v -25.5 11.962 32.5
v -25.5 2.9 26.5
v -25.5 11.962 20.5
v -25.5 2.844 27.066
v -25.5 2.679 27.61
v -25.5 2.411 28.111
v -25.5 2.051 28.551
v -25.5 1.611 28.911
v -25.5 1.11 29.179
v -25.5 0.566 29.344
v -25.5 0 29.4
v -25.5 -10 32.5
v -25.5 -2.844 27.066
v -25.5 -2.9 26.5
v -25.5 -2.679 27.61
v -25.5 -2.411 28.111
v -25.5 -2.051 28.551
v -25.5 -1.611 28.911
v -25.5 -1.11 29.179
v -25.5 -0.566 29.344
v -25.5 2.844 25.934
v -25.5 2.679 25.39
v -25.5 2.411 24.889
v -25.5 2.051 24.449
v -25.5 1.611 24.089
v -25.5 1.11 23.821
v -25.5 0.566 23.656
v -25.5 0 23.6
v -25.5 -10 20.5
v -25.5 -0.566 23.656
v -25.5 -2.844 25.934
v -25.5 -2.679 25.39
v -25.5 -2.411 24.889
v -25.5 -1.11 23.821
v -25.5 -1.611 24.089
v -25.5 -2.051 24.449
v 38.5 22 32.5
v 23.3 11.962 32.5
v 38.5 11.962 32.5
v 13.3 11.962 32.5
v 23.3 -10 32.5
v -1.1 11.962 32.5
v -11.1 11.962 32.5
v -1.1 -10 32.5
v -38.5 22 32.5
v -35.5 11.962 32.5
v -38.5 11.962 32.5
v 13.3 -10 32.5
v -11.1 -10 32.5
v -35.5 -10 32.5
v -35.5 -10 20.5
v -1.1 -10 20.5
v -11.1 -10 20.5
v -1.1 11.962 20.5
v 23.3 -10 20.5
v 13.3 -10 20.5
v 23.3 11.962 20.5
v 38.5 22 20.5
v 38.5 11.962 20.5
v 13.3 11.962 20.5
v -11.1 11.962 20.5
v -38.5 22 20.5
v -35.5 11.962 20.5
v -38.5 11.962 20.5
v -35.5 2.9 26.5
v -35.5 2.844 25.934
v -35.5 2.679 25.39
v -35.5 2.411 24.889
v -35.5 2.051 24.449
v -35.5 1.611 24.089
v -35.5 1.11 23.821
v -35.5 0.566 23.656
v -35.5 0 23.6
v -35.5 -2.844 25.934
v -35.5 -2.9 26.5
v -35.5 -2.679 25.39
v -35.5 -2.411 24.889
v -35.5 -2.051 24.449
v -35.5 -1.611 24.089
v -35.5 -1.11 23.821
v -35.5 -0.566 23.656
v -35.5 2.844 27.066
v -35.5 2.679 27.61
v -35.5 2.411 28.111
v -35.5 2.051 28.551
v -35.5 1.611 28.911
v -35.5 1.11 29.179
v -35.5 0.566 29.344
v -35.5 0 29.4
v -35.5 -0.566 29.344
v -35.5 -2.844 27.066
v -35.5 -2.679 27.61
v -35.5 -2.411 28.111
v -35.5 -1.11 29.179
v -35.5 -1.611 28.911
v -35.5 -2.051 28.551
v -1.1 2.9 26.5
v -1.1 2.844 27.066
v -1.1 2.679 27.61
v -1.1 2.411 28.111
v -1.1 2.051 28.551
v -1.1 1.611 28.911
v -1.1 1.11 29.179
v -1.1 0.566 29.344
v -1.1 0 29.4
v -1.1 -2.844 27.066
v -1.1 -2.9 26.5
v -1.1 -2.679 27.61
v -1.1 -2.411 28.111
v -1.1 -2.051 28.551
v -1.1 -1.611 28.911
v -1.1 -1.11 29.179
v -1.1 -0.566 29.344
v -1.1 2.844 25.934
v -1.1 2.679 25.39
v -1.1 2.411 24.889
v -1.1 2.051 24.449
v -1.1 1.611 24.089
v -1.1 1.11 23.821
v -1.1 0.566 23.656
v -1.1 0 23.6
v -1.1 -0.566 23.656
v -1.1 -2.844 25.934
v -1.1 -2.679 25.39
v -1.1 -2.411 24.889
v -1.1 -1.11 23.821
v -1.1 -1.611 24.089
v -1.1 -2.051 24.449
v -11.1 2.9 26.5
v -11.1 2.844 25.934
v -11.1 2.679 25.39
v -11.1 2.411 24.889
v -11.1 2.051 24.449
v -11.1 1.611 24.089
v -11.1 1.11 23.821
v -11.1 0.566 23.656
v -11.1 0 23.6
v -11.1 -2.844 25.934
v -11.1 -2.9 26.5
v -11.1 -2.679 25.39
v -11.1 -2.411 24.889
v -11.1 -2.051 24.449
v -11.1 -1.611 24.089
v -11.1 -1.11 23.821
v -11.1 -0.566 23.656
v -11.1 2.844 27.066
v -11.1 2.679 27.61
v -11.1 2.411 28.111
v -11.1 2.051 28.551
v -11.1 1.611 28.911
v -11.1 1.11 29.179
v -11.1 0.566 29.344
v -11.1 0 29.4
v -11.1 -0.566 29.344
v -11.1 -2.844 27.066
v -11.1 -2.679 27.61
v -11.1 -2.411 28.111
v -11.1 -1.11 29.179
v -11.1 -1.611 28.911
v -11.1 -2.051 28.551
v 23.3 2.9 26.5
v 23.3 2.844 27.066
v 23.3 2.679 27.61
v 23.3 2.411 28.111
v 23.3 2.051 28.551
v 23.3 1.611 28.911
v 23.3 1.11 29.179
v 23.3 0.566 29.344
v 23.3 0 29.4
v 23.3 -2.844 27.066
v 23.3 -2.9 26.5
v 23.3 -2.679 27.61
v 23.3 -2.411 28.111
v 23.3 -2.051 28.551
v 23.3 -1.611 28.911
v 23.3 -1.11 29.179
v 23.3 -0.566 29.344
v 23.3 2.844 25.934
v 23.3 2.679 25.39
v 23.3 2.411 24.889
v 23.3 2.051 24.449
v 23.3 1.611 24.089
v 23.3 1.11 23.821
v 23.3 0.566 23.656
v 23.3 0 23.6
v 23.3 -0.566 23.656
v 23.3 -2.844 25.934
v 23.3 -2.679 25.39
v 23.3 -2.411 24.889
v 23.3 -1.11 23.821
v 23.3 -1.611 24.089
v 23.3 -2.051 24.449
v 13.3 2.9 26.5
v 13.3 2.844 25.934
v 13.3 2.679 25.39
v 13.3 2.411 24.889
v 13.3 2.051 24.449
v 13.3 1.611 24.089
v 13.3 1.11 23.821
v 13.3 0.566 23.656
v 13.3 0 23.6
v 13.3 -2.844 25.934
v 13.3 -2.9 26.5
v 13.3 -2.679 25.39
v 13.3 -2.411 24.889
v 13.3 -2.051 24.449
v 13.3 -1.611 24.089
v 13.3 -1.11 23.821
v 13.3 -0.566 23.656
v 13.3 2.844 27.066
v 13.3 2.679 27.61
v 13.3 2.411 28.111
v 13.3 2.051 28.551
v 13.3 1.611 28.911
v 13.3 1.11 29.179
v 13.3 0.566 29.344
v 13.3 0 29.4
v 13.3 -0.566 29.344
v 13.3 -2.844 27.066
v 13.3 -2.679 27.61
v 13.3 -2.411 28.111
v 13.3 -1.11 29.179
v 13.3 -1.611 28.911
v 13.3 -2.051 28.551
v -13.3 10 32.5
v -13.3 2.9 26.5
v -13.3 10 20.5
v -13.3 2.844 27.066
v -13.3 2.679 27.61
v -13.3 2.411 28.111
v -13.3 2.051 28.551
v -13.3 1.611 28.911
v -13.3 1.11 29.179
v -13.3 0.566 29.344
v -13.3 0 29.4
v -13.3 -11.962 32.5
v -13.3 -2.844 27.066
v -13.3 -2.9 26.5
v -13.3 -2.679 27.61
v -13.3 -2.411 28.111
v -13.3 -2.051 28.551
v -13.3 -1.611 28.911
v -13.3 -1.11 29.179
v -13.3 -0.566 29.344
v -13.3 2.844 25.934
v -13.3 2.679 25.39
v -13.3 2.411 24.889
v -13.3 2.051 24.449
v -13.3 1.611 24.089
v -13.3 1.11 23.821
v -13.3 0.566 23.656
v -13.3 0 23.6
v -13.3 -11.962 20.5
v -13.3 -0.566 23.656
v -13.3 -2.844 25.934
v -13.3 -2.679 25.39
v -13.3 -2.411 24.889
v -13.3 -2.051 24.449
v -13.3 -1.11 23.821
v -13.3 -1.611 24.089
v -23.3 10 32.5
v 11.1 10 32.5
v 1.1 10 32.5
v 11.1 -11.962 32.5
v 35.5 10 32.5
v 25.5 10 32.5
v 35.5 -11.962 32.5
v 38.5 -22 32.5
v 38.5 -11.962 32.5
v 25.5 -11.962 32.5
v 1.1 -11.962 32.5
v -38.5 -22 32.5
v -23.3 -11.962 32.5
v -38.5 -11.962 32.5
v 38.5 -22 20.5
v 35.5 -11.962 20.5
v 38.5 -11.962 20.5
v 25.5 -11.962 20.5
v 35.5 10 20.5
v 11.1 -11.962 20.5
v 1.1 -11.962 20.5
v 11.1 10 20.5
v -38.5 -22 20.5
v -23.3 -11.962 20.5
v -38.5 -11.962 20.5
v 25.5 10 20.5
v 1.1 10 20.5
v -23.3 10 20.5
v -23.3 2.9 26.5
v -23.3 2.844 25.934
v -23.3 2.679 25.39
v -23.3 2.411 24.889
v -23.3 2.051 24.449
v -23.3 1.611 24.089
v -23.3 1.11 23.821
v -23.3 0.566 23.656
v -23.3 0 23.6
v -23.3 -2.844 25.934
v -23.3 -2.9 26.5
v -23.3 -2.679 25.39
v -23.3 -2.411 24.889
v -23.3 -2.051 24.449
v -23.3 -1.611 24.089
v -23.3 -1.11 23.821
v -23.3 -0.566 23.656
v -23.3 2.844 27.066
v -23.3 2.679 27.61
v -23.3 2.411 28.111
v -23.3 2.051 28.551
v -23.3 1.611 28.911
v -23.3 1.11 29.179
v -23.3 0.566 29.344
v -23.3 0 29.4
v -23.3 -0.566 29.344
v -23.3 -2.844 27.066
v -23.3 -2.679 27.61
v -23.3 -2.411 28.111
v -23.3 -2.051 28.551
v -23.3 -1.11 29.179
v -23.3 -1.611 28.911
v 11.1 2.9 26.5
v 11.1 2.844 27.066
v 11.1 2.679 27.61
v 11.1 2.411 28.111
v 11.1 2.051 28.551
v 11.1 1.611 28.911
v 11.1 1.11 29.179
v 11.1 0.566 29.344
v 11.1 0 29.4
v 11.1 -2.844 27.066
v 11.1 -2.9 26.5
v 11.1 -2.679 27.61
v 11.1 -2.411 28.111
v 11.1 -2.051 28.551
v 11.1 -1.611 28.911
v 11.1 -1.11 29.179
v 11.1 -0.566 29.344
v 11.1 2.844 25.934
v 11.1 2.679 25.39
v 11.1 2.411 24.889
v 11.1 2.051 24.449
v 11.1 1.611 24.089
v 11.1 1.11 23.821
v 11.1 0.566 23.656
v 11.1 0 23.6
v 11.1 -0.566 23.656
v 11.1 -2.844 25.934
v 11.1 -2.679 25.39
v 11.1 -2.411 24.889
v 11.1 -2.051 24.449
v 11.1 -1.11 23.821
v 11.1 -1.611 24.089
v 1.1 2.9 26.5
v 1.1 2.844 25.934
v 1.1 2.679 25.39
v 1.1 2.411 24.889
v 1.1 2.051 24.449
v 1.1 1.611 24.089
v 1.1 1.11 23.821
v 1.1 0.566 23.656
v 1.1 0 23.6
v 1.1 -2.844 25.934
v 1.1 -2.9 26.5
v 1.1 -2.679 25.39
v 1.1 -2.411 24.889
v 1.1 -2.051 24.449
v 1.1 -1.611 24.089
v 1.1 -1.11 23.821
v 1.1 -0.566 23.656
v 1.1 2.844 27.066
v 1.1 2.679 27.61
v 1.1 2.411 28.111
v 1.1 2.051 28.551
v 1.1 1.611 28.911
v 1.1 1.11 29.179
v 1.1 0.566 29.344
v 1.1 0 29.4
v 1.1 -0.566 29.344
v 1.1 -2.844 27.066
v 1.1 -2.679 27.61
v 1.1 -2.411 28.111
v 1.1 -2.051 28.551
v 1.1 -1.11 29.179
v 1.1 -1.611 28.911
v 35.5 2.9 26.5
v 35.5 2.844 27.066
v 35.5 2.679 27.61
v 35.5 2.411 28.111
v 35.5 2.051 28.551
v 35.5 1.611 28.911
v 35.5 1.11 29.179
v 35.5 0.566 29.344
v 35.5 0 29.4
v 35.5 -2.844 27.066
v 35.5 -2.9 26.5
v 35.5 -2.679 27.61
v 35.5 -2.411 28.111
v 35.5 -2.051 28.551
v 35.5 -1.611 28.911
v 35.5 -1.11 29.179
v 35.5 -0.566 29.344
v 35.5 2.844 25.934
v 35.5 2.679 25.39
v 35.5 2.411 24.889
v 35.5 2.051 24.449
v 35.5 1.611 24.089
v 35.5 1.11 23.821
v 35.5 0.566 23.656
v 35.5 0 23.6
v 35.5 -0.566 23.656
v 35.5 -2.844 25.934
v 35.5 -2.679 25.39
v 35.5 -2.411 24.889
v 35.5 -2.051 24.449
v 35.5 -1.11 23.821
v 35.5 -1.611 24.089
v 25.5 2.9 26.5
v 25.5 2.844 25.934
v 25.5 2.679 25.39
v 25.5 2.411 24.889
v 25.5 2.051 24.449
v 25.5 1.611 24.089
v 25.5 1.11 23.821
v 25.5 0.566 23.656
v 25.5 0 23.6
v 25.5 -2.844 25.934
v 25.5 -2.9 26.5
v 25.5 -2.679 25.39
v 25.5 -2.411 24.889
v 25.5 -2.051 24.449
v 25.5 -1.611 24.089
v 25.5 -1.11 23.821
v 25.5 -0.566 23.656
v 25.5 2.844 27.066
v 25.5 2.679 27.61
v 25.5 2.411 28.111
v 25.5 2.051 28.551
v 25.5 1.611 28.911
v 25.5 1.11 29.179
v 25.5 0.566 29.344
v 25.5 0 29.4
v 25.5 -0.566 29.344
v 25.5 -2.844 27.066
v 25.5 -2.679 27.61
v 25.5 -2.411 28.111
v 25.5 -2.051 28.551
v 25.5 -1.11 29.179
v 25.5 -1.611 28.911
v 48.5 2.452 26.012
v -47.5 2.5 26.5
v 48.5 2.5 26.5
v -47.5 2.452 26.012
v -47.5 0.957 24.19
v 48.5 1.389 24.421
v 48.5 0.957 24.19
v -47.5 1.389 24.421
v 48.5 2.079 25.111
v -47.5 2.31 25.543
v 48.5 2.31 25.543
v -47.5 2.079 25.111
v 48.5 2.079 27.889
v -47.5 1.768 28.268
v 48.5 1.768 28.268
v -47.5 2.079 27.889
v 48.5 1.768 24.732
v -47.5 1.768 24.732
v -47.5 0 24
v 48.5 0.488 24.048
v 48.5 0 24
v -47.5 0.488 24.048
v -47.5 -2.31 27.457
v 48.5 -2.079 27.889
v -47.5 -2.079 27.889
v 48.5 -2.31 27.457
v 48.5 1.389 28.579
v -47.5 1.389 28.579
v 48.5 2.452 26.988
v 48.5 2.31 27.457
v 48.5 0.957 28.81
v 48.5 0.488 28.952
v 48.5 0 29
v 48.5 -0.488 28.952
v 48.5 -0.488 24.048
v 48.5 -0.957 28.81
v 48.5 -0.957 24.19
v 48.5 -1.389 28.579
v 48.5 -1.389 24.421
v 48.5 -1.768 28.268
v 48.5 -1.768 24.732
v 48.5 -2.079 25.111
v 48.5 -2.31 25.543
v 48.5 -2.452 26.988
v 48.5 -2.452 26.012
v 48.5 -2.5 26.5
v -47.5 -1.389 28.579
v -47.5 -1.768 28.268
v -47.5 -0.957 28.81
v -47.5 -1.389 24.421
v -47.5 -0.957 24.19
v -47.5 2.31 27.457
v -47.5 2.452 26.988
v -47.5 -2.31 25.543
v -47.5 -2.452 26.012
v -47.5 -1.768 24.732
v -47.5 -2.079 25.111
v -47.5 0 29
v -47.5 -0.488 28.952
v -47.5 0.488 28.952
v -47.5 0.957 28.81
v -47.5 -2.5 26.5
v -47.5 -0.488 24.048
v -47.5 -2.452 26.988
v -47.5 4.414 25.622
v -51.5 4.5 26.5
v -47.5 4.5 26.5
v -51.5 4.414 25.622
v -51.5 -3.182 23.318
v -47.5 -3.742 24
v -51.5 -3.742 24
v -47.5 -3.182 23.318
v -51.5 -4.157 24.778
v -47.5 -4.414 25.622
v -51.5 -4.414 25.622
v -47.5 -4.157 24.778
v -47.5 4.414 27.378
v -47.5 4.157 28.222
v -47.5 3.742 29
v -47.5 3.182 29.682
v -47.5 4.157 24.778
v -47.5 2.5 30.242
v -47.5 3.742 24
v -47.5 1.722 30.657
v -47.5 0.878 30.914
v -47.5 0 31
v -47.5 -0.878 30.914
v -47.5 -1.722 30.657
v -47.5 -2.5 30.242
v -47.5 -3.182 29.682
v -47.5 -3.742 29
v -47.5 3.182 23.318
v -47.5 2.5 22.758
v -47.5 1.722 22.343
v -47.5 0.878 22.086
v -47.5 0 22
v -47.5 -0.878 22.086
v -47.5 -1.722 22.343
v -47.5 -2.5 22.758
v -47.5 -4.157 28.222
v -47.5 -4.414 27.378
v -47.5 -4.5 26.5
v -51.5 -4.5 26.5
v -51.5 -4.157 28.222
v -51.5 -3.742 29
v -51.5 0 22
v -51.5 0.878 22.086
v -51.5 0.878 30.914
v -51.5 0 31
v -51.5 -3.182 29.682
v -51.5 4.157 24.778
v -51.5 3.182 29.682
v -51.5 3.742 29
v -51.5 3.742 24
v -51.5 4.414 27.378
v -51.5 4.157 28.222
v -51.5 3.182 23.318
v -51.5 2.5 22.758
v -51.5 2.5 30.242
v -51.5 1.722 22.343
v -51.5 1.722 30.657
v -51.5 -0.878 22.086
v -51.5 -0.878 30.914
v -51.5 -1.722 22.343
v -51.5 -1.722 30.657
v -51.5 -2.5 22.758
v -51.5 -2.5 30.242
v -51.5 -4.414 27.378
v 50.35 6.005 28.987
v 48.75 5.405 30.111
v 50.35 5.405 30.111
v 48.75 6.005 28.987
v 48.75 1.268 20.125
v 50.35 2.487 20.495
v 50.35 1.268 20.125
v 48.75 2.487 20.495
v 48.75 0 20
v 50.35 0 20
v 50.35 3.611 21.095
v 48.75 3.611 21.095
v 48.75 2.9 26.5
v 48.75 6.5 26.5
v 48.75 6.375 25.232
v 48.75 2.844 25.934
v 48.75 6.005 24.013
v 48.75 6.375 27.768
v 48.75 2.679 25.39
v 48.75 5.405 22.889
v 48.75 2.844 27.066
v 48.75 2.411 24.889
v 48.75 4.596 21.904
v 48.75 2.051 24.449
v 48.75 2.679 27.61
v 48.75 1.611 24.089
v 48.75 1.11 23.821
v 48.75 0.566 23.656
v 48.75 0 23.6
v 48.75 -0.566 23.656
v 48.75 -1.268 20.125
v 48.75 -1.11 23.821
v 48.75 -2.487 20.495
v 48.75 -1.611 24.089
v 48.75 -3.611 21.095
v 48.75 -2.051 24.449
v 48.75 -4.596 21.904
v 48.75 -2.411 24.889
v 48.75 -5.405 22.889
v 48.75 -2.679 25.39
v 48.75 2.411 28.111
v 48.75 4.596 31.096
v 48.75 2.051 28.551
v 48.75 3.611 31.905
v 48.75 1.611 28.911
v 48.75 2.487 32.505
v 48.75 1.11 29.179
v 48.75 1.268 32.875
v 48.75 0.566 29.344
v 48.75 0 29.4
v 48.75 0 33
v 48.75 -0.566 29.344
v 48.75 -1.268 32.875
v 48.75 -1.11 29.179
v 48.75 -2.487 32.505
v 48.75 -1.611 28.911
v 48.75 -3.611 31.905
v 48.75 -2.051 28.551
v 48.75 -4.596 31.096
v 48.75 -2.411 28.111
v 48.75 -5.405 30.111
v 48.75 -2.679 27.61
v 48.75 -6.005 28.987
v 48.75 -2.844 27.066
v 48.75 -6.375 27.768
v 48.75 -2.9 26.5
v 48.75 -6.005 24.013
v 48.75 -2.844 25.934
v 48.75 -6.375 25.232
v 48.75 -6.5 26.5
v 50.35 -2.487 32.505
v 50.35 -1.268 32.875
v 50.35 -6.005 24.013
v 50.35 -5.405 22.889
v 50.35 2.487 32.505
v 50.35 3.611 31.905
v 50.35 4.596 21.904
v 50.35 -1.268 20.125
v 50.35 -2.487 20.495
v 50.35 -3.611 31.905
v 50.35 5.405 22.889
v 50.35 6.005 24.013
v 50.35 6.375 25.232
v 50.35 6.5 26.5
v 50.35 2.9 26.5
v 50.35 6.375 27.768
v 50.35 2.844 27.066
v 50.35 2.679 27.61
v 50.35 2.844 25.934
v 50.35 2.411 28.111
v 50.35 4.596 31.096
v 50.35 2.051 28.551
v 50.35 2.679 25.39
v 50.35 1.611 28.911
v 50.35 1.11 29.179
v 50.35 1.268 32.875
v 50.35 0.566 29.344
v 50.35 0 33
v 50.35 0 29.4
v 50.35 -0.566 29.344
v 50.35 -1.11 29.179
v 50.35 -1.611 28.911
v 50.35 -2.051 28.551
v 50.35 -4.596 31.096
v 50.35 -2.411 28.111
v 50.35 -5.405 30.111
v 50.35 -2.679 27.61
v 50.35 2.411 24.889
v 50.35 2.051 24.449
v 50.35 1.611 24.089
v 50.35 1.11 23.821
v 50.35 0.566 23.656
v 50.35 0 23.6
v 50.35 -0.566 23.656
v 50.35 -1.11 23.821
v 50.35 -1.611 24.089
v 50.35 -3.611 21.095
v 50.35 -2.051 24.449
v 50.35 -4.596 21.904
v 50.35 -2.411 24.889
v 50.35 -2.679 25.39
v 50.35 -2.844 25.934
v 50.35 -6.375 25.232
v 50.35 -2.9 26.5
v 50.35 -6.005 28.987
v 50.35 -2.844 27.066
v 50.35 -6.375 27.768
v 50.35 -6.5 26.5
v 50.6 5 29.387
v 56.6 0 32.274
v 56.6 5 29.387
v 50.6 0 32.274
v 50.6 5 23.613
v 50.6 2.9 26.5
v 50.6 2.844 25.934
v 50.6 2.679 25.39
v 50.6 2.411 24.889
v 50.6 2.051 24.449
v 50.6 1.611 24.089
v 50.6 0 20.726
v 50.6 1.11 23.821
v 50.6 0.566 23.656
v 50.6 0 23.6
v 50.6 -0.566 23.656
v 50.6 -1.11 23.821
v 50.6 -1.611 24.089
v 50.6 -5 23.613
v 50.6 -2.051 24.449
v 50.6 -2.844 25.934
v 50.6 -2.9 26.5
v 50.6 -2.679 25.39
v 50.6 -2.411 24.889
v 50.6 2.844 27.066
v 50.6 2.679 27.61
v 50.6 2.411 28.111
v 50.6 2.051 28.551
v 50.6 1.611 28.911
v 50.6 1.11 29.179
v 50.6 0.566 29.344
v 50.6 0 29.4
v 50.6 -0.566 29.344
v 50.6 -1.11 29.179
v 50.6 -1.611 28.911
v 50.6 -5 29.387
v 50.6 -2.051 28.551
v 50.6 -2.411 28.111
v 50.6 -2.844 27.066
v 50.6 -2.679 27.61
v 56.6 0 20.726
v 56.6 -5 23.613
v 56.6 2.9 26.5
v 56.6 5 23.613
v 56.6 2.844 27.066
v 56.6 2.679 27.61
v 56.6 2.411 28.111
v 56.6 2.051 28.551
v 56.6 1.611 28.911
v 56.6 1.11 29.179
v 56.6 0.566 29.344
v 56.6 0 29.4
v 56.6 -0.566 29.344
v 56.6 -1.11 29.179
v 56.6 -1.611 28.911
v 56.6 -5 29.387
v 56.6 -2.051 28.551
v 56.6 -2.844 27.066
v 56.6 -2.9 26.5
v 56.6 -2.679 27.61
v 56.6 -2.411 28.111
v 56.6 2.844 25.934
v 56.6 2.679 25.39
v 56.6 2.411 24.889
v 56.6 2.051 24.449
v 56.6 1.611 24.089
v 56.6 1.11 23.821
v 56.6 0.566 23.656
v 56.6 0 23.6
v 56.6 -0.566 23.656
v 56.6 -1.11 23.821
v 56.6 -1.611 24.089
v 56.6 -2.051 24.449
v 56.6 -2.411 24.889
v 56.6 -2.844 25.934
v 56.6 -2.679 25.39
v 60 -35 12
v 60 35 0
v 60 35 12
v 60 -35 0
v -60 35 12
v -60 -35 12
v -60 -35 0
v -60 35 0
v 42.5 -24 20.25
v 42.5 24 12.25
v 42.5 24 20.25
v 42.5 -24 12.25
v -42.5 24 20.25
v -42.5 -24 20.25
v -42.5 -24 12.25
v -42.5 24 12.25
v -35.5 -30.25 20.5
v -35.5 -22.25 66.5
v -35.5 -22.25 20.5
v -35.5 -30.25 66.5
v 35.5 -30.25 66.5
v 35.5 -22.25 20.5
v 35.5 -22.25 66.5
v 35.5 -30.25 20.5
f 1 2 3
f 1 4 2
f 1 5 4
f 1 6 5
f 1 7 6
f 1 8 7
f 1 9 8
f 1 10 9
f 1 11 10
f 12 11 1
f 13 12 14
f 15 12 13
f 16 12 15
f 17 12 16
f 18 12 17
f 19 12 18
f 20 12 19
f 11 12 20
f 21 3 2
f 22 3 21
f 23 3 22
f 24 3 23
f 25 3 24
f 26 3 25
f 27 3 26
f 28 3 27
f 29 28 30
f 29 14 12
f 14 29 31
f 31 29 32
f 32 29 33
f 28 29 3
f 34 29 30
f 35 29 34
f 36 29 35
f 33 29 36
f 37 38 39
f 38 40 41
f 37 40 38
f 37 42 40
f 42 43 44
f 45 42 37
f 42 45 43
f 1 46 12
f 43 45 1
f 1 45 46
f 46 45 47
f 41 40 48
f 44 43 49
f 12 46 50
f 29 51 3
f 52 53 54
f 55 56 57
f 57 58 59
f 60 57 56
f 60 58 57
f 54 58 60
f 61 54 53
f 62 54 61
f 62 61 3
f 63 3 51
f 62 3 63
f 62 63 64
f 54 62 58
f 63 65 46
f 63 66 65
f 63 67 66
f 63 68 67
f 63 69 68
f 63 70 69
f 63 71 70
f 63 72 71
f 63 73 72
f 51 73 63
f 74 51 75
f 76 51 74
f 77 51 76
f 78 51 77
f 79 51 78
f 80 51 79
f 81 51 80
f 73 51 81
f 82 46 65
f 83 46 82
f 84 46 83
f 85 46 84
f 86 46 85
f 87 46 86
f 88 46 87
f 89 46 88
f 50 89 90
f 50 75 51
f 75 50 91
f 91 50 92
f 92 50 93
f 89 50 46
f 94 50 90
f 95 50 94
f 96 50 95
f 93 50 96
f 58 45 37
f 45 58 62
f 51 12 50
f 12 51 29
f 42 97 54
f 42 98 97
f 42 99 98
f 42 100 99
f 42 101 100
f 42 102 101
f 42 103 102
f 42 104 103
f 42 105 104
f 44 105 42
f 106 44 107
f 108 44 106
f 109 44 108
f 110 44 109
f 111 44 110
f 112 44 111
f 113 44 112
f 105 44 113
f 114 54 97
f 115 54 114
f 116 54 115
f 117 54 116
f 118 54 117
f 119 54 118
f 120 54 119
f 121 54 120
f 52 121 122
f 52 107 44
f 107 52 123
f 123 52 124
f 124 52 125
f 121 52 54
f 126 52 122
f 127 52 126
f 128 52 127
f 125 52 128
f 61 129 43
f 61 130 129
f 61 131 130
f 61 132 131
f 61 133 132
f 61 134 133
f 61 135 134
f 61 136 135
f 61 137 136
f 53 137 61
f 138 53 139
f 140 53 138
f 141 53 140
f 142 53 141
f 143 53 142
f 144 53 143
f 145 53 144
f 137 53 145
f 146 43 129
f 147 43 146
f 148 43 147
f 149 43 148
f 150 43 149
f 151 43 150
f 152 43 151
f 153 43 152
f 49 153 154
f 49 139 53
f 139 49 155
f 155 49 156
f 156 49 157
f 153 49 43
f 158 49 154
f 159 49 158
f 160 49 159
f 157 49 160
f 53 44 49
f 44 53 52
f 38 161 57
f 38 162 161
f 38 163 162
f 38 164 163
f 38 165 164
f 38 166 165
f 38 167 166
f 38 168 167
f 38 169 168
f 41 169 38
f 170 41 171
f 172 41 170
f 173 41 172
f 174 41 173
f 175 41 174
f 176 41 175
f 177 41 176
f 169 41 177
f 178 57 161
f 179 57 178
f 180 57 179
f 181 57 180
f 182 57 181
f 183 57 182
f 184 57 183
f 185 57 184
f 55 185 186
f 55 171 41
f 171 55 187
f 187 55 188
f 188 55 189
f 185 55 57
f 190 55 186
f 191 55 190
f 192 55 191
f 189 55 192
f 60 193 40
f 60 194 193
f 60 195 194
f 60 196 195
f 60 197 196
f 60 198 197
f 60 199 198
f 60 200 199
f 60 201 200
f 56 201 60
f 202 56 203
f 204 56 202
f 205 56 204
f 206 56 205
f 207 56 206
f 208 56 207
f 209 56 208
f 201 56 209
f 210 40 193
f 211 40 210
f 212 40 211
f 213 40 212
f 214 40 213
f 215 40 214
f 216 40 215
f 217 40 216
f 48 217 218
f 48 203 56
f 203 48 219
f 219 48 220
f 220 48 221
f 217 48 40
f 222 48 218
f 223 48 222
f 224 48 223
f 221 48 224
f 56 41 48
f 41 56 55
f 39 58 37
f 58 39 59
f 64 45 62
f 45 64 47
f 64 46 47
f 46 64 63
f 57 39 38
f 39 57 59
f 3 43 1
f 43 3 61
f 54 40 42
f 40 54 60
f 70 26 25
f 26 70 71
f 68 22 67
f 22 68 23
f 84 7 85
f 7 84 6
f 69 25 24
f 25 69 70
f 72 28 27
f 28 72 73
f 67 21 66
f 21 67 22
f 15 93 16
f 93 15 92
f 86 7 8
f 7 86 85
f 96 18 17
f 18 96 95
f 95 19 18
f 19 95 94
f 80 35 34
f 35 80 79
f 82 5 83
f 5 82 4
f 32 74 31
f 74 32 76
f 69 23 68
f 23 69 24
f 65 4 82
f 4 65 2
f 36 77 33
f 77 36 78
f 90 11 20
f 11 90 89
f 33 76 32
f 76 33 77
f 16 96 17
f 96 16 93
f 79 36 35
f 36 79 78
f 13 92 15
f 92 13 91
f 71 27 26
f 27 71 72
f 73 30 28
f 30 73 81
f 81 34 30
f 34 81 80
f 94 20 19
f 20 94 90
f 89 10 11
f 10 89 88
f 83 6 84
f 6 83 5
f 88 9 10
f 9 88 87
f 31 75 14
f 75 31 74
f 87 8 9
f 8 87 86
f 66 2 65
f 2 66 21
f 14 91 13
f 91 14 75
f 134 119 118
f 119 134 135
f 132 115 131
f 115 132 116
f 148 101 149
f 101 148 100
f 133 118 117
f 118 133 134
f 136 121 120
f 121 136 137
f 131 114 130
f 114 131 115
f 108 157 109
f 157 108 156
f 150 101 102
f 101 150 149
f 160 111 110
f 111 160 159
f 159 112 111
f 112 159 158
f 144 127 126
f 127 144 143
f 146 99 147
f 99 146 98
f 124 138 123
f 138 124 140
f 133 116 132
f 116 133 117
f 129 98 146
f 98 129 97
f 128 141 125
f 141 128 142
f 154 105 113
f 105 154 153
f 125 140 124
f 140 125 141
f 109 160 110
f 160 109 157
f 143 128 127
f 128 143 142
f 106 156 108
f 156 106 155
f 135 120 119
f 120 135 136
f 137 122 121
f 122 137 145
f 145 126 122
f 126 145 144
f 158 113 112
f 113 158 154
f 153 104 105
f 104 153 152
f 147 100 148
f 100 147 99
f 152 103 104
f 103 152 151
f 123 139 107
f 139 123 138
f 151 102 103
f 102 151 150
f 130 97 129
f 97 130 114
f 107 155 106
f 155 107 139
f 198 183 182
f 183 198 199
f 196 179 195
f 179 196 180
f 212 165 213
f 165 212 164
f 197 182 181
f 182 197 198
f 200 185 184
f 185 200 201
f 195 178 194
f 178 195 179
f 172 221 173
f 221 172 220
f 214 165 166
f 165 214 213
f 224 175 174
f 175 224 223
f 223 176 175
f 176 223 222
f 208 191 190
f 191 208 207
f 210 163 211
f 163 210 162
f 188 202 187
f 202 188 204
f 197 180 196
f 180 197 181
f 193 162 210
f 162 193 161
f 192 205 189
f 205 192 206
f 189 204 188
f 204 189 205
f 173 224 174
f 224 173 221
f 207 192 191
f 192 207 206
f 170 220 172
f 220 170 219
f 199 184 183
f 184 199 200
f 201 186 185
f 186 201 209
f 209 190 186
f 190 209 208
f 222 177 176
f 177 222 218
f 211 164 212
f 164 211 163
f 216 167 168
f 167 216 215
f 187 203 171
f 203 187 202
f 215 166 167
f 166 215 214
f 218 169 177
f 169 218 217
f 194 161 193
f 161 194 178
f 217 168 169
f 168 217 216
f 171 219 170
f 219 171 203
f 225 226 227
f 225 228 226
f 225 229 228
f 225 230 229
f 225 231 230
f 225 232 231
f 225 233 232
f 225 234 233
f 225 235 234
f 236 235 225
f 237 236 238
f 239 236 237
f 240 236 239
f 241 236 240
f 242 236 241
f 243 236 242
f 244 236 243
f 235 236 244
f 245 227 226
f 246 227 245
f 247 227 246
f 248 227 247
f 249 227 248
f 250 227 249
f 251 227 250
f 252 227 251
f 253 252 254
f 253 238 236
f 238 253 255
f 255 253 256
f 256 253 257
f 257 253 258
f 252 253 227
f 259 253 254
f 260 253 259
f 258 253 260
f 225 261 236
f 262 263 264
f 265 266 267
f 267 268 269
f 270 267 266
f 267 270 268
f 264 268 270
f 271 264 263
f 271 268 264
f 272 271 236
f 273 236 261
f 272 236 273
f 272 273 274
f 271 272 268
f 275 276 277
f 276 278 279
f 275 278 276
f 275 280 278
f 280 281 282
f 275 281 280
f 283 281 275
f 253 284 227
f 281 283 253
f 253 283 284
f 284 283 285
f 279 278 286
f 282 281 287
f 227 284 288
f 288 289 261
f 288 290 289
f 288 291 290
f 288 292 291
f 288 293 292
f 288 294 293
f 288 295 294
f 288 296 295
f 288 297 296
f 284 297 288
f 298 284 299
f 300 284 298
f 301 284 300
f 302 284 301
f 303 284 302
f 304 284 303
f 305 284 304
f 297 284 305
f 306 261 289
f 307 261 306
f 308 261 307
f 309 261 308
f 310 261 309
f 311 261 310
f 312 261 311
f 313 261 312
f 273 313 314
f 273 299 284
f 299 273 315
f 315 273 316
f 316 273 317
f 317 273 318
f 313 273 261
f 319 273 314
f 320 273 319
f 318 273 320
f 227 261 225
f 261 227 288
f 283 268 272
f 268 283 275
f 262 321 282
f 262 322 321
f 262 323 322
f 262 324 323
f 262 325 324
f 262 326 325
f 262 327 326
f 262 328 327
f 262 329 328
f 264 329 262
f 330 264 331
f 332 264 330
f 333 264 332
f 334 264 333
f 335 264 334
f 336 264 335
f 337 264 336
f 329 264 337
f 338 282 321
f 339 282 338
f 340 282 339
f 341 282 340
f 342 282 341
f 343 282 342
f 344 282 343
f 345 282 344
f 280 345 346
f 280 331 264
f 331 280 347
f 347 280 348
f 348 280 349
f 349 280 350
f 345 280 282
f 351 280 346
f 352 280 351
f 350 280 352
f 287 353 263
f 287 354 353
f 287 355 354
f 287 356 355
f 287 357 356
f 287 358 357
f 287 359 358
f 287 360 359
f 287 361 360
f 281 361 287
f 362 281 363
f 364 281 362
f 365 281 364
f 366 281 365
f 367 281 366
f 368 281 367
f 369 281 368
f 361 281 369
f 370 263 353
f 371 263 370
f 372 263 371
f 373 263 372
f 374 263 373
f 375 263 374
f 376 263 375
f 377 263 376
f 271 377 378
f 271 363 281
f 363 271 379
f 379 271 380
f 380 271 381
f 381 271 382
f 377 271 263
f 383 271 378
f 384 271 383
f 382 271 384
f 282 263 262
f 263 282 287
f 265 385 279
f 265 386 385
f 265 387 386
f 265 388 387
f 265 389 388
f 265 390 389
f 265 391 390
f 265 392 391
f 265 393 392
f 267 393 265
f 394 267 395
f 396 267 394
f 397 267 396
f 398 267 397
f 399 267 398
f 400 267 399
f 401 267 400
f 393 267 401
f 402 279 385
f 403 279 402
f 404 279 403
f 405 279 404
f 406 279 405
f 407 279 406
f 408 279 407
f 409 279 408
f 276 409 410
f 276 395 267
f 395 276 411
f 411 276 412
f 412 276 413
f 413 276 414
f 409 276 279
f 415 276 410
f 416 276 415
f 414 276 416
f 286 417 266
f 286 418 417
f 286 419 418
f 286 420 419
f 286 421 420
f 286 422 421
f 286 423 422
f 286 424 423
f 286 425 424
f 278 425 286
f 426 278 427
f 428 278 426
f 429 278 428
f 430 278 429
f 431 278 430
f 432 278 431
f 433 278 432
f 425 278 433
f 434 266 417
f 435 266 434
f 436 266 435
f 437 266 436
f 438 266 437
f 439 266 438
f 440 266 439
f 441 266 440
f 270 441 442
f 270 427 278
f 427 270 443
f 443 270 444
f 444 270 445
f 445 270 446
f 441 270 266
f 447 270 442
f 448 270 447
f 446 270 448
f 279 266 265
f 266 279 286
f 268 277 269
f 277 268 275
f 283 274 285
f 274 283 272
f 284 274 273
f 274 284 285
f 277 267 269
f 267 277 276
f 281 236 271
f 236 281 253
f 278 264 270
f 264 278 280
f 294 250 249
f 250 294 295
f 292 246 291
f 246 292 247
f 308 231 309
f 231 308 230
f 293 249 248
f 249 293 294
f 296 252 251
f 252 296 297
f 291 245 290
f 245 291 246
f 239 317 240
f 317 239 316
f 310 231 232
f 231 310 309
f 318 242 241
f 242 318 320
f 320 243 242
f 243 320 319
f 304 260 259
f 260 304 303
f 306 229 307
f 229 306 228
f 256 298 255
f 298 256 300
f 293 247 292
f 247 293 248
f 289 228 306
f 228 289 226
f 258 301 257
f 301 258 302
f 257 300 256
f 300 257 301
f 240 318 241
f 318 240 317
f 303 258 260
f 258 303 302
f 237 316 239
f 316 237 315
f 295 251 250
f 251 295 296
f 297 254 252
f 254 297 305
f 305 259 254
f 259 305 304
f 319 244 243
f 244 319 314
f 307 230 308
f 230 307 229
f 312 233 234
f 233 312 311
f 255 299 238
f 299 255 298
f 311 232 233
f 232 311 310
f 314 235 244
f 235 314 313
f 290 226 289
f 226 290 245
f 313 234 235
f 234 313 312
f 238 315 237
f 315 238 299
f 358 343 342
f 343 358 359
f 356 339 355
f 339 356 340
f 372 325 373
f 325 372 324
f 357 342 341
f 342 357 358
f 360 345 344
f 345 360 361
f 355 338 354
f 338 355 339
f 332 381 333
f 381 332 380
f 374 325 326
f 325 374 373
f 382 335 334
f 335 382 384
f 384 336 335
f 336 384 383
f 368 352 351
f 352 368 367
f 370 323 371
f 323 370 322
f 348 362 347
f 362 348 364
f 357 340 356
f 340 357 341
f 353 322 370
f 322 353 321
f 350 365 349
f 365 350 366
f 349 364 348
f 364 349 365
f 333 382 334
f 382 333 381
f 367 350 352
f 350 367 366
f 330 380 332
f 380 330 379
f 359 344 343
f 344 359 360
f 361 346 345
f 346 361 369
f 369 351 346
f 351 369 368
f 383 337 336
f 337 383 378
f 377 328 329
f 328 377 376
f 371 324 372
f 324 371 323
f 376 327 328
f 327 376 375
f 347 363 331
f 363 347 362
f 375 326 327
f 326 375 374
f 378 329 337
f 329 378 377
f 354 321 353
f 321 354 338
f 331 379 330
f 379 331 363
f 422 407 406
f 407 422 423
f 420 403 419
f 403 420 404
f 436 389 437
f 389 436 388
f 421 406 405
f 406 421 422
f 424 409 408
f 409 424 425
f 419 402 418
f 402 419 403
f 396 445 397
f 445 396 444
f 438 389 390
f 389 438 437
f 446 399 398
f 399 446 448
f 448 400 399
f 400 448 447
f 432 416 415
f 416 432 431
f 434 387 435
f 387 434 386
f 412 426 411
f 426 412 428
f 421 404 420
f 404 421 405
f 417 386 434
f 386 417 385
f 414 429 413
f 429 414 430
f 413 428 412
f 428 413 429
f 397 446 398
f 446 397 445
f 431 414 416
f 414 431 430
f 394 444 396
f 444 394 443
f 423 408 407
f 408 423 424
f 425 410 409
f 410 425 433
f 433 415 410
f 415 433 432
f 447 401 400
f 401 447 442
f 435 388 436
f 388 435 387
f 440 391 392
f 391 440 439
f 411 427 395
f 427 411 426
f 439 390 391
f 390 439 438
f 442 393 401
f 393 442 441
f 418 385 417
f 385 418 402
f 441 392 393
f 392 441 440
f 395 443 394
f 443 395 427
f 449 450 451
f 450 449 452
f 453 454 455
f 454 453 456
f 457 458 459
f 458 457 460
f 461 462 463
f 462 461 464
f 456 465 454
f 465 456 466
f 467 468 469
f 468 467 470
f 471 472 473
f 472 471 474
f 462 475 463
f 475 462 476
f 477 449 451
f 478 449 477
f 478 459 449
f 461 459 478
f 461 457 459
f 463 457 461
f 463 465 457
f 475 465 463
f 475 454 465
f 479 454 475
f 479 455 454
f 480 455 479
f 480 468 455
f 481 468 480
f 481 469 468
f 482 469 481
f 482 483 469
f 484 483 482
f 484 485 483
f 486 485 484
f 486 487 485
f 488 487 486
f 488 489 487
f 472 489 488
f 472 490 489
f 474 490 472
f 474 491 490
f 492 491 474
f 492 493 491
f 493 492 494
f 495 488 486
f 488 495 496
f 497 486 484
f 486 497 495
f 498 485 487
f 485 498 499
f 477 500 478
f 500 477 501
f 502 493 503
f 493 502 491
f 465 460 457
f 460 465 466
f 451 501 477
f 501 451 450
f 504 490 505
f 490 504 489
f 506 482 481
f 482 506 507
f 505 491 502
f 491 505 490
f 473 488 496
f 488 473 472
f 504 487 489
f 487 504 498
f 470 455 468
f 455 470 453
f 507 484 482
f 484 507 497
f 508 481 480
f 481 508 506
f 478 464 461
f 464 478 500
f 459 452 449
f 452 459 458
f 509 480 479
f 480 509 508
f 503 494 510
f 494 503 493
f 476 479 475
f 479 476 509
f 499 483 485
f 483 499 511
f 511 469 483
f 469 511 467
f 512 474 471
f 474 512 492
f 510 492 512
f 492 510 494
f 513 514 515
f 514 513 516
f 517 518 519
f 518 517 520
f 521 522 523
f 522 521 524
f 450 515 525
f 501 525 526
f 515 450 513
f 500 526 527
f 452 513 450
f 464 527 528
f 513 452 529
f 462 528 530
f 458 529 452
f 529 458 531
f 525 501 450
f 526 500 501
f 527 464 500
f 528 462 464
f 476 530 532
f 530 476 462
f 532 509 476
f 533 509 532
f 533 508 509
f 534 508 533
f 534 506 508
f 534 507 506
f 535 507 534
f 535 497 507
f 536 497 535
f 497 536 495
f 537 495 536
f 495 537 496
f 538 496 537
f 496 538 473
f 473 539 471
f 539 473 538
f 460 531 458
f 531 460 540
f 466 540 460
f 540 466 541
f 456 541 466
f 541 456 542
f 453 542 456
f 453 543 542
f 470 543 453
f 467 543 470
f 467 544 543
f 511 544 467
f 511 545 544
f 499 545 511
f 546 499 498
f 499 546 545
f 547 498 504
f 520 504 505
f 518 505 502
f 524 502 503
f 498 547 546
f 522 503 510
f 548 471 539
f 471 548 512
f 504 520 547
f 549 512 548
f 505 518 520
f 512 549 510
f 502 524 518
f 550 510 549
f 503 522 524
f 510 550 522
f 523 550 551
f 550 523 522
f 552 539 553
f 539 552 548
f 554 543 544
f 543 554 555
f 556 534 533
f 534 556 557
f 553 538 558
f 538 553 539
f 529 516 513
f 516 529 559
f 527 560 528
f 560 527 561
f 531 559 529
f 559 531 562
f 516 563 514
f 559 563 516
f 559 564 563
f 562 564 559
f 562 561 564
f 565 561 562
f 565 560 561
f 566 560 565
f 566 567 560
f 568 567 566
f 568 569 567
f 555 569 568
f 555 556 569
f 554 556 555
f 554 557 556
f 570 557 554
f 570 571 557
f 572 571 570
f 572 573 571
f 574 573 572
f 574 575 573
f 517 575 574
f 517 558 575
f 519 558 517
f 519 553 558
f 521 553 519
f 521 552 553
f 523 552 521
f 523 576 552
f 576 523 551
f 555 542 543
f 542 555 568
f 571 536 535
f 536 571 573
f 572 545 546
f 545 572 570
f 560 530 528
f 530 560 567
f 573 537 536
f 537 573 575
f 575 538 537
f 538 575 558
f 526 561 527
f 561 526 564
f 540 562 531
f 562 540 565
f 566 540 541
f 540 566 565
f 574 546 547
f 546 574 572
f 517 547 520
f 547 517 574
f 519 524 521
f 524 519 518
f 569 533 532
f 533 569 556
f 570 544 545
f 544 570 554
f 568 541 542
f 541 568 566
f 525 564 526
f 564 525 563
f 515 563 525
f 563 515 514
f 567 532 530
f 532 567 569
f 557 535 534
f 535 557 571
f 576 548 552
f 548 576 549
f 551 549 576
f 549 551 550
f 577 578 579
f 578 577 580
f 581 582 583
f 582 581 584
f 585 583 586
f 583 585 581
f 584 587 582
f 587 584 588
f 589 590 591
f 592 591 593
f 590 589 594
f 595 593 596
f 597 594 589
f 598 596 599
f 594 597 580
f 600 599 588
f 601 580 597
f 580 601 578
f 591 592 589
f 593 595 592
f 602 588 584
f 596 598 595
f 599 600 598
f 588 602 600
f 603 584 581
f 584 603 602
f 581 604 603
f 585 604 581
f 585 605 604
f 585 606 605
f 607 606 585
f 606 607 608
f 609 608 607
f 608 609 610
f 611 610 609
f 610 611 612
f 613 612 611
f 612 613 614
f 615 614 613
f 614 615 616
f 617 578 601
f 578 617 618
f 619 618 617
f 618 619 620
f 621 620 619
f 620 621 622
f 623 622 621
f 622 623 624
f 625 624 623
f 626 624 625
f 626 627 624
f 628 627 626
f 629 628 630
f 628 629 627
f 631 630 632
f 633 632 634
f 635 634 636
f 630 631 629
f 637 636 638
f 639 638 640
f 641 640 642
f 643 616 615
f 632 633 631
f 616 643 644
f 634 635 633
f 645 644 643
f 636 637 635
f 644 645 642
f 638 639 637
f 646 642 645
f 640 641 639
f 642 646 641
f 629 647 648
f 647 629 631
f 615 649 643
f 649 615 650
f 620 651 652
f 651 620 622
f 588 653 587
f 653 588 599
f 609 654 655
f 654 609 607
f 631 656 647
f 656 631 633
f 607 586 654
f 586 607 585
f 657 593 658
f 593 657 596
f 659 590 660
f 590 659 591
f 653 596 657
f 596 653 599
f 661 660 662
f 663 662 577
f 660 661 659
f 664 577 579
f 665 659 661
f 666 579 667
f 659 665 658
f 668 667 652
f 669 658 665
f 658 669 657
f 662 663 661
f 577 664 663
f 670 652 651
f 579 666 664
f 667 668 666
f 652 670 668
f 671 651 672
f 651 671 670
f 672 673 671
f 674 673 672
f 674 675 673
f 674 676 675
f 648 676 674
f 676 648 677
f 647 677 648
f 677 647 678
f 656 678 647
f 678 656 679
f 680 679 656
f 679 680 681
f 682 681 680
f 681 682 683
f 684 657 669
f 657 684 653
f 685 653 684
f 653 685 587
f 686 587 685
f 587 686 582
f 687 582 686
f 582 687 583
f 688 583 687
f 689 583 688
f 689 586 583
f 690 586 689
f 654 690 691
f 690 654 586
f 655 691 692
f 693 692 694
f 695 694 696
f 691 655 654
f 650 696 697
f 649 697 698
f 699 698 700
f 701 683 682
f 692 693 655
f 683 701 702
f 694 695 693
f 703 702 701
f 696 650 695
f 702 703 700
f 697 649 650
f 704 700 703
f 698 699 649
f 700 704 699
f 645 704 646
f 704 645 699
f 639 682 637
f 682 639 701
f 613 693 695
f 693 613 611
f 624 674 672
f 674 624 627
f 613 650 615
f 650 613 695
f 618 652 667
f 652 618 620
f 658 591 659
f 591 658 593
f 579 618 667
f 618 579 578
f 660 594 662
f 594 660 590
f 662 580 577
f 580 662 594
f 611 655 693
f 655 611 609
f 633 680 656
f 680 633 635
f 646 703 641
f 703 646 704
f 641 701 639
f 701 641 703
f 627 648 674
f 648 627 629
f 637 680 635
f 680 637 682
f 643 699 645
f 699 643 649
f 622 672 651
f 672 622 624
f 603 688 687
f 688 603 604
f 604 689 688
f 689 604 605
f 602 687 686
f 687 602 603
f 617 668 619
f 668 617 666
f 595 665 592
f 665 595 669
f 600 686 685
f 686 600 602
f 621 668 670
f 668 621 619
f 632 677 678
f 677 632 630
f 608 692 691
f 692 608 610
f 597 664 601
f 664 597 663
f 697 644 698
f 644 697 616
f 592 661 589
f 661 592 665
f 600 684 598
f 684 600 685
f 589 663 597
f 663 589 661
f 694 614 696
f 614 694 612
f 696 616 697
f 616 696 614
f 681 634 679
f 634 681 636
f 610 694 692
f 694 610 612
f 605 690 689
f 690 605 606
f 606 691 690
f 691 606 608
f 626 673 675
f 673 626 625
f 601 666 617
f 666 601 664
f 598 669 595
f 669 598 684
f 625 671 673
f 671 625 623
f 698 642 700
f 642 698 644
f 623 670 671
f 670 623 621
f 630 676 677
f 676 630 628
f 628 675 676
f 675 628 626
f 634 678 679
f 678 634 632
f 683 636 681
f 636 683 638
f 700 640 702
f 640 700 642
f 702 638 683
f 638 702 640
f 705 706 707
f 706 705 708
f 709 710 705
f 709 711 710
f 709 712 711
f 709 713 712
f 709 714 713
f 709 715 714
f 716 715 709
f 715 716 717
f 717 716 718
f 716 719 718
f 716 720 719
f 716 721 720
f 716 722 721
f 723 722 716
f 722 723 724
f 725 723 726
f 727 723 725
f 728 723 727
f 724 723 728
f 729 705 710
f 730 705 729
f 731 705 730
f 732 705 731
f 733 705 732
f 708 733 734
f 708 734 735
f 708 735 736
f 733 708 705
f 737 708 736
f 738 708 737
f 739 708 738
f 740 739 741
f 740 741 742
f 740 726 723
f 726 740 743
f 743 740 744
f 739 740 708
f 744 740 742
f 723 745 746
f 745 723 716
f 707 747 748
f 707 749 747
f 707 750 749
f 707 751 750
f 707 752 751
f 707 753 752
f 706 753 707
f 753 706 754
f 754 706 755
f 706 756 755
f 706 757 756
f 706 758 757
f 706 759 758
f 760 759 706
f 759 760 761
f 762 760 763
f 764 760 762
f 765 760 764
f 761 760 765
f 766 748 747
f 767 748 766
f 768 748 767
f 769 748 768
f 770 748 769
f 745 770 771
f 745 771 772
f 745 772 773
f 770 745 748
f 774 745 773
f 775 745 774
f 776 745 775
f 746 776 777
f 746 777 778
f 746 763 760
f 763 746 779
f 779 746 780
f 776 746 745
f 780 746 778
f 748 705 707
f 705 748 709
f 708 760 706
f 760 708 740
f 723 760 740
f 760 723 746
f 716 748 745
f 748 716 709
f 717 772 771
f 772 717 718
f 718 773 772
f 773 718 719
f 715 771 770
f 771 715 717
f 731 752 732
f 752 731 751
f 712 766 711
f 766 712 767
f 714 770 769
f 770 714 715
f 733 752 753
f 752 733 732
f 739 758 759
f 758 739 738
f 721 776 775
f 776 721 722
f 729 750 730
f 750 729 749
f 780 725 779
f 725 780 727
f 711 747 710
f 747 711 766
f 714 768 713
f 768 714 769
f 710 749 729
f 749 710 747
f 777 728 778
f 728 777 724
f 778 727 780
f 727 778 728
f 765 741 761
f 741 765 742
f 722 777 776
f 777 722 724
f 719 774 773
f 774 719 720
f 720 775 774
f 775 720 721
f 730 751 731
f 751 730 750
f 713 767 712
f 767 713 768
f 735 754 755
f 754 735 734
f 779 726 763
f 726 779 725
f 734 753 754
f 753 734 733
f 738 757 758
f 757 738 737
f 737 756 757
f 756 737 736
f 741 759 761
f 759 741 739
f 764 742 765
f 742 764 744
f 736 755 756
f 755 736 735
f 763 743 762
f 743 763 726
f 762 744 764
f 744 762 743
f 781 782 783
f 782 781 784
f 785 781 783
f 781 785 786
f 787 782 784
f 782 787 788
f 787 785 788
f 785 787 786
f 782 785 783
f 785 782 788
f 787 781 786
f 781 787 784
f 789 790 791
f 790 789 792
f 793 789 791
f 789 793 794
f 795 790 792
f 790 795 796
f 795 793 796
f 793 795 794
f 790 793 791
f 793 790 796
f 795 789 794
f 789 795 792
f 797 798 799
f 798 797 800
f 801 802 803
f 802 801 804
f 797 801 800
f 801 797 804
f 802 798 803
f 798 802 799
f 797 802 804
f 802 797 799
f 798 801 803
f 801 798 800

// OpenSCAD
$fn = 32;

// ------------------------------------------------------------------------
// Comb hinge with flap: leaf 77 x 22 mm, pin d5, flap 46 mm
// Every part is its own module, assembly() places every instance.
// ------------------------------------------------------------------------

// --- part 1 ---
module hinge_bed() {
  difference() {
    translate([-60, -35, 0]) cube([120, 70, 12]);
  }
}

// --- part 2 ---
module hinge_riser() {
  difference() {
    translate([-42.5, -24, 0]) cube([85, 48, 8]);
  }
}

// --- part 3 ---
module hinge_leaf_a() {
  difference() {
    union() {
      translate([-35.5, -10, -6]) cube([10, 32, 12]);
      translate([-11.1, -10, -6]) cube([10, 32, 12]);
      translate([13.3, -10, -6]) cube([10, 32, 12]);
      translate([-38.5, 11.962, -6]) cube([77, 10.038, 12]);
    }
    translate([-30.5, 0, 0]) rotate([0, 90, 0]) cylinder(h = 12, d = 5.8, center = true);
    translate([-6.1, 0, 0]) rotate([0, 90, 0]) cylinder(h = 12, d = 5.8, center = true);
    translate([18.3, 0, 0]) rotate([0, 90, 0]) cylinder(h = 12, d = 5.8, center = true);
  }
}

// --- part 4 ---
module hinge_leaf_b() {
  difference() {
    union() {
      translate([-23.3, -22, -6]) cube([10, 32, 12]);
      translate([1.1, -22, -6]) cube([10, 32, 12]);
      translate([25.5, -22, -6]) cube([10, 32, 12]);
      translate([-38.5, -22, -6]) cube([77, 10.038, 12]);
    }
    translate([-18.3, 0, 0]) rotate([0, 90, 0]) cylinder(h = 12, d = 5.8, center = true);
    translate([6.1, 0, 0]) rotate([0, 90, 0]) cylinder(h = 12, d = 5.8, center = true);
    translate([30.5, 0, 0]) rotate([0, 90, 0]) cylinder(h = 12, d = 5.8, center = true);
  }
}

// --- part 5 ---
module hinge_flap() {
  difference() {
    translate([-35.5, -23, 0]) cube([71, 46, 8]);
  }
}

// --- part 6 ---
module hinge_pin() {
  rotate([0, 90, 0]) cylinder(h = 97, d = 5, center = true);
  translate([-51.5, 0, 0]) rotate([0, 90, 0]) cylinder(h = 4, d = 9);
}

// --- part 7 ---
module pin_washer() {
  difference() {
      translate([0, 0, 0]) cylinder(h = 1.6, d = 13);
      translate([0, 0, -1]) cylinder(h = 3.6, d = 5.8);
    }
}

// --- part 8 ---
module pin_nut() {
  difference() {
    linear_extrude(height = 6) polygon(points = [[5.774, 0], [2.887, 5], [-2.887, 5], [-5.774, 0], [-2.887, -5], [2.887, -5]]);
    translate([0, 0, -1]) cylinder(h = 8, d = 5.8);
  }
}

// --- assembly ---
module assembly() {
  color([0.80, 0.24, 0.20]) translate([0, 0, 0]) rotate([0, 0, 0]) hinge_bed();
  color([0.20, 0.45, 0.75]) translate([0, 0, 12.25]) rotate([0, 0, 0]) hinge_riser();
  color([0.25, 0.62, 0.32]) translate([0, 0, 26.5]) rotate([0, 0, 0]) hinge_leaf_a();
  color([0.92, 0.70, 0.18]) translate([0, 0, 26.5]) rotate([0, 0, 0]) hinge_leaf_b();
  color([0.58, 0.35, 0.70]) translate([0, -22.25, 43.5]) rotate([90, 0, 0]) hinge_flap();
  color([0.16, 0.66, 0.66]) translate([0, 0, 26.5]) rotate([0, 0, 0]) hinge_pin();
  color([0.85, 0.48, 0.18]) translate([48.75, 0, 26.5]) rotate([0, 90, 0]) pin_washer();
  color([0.55, 0.60, 0.65]) translate([50.6, 0, 26.5]) rotate([0, 90, 0]) pin_nut();
}

assembly();
